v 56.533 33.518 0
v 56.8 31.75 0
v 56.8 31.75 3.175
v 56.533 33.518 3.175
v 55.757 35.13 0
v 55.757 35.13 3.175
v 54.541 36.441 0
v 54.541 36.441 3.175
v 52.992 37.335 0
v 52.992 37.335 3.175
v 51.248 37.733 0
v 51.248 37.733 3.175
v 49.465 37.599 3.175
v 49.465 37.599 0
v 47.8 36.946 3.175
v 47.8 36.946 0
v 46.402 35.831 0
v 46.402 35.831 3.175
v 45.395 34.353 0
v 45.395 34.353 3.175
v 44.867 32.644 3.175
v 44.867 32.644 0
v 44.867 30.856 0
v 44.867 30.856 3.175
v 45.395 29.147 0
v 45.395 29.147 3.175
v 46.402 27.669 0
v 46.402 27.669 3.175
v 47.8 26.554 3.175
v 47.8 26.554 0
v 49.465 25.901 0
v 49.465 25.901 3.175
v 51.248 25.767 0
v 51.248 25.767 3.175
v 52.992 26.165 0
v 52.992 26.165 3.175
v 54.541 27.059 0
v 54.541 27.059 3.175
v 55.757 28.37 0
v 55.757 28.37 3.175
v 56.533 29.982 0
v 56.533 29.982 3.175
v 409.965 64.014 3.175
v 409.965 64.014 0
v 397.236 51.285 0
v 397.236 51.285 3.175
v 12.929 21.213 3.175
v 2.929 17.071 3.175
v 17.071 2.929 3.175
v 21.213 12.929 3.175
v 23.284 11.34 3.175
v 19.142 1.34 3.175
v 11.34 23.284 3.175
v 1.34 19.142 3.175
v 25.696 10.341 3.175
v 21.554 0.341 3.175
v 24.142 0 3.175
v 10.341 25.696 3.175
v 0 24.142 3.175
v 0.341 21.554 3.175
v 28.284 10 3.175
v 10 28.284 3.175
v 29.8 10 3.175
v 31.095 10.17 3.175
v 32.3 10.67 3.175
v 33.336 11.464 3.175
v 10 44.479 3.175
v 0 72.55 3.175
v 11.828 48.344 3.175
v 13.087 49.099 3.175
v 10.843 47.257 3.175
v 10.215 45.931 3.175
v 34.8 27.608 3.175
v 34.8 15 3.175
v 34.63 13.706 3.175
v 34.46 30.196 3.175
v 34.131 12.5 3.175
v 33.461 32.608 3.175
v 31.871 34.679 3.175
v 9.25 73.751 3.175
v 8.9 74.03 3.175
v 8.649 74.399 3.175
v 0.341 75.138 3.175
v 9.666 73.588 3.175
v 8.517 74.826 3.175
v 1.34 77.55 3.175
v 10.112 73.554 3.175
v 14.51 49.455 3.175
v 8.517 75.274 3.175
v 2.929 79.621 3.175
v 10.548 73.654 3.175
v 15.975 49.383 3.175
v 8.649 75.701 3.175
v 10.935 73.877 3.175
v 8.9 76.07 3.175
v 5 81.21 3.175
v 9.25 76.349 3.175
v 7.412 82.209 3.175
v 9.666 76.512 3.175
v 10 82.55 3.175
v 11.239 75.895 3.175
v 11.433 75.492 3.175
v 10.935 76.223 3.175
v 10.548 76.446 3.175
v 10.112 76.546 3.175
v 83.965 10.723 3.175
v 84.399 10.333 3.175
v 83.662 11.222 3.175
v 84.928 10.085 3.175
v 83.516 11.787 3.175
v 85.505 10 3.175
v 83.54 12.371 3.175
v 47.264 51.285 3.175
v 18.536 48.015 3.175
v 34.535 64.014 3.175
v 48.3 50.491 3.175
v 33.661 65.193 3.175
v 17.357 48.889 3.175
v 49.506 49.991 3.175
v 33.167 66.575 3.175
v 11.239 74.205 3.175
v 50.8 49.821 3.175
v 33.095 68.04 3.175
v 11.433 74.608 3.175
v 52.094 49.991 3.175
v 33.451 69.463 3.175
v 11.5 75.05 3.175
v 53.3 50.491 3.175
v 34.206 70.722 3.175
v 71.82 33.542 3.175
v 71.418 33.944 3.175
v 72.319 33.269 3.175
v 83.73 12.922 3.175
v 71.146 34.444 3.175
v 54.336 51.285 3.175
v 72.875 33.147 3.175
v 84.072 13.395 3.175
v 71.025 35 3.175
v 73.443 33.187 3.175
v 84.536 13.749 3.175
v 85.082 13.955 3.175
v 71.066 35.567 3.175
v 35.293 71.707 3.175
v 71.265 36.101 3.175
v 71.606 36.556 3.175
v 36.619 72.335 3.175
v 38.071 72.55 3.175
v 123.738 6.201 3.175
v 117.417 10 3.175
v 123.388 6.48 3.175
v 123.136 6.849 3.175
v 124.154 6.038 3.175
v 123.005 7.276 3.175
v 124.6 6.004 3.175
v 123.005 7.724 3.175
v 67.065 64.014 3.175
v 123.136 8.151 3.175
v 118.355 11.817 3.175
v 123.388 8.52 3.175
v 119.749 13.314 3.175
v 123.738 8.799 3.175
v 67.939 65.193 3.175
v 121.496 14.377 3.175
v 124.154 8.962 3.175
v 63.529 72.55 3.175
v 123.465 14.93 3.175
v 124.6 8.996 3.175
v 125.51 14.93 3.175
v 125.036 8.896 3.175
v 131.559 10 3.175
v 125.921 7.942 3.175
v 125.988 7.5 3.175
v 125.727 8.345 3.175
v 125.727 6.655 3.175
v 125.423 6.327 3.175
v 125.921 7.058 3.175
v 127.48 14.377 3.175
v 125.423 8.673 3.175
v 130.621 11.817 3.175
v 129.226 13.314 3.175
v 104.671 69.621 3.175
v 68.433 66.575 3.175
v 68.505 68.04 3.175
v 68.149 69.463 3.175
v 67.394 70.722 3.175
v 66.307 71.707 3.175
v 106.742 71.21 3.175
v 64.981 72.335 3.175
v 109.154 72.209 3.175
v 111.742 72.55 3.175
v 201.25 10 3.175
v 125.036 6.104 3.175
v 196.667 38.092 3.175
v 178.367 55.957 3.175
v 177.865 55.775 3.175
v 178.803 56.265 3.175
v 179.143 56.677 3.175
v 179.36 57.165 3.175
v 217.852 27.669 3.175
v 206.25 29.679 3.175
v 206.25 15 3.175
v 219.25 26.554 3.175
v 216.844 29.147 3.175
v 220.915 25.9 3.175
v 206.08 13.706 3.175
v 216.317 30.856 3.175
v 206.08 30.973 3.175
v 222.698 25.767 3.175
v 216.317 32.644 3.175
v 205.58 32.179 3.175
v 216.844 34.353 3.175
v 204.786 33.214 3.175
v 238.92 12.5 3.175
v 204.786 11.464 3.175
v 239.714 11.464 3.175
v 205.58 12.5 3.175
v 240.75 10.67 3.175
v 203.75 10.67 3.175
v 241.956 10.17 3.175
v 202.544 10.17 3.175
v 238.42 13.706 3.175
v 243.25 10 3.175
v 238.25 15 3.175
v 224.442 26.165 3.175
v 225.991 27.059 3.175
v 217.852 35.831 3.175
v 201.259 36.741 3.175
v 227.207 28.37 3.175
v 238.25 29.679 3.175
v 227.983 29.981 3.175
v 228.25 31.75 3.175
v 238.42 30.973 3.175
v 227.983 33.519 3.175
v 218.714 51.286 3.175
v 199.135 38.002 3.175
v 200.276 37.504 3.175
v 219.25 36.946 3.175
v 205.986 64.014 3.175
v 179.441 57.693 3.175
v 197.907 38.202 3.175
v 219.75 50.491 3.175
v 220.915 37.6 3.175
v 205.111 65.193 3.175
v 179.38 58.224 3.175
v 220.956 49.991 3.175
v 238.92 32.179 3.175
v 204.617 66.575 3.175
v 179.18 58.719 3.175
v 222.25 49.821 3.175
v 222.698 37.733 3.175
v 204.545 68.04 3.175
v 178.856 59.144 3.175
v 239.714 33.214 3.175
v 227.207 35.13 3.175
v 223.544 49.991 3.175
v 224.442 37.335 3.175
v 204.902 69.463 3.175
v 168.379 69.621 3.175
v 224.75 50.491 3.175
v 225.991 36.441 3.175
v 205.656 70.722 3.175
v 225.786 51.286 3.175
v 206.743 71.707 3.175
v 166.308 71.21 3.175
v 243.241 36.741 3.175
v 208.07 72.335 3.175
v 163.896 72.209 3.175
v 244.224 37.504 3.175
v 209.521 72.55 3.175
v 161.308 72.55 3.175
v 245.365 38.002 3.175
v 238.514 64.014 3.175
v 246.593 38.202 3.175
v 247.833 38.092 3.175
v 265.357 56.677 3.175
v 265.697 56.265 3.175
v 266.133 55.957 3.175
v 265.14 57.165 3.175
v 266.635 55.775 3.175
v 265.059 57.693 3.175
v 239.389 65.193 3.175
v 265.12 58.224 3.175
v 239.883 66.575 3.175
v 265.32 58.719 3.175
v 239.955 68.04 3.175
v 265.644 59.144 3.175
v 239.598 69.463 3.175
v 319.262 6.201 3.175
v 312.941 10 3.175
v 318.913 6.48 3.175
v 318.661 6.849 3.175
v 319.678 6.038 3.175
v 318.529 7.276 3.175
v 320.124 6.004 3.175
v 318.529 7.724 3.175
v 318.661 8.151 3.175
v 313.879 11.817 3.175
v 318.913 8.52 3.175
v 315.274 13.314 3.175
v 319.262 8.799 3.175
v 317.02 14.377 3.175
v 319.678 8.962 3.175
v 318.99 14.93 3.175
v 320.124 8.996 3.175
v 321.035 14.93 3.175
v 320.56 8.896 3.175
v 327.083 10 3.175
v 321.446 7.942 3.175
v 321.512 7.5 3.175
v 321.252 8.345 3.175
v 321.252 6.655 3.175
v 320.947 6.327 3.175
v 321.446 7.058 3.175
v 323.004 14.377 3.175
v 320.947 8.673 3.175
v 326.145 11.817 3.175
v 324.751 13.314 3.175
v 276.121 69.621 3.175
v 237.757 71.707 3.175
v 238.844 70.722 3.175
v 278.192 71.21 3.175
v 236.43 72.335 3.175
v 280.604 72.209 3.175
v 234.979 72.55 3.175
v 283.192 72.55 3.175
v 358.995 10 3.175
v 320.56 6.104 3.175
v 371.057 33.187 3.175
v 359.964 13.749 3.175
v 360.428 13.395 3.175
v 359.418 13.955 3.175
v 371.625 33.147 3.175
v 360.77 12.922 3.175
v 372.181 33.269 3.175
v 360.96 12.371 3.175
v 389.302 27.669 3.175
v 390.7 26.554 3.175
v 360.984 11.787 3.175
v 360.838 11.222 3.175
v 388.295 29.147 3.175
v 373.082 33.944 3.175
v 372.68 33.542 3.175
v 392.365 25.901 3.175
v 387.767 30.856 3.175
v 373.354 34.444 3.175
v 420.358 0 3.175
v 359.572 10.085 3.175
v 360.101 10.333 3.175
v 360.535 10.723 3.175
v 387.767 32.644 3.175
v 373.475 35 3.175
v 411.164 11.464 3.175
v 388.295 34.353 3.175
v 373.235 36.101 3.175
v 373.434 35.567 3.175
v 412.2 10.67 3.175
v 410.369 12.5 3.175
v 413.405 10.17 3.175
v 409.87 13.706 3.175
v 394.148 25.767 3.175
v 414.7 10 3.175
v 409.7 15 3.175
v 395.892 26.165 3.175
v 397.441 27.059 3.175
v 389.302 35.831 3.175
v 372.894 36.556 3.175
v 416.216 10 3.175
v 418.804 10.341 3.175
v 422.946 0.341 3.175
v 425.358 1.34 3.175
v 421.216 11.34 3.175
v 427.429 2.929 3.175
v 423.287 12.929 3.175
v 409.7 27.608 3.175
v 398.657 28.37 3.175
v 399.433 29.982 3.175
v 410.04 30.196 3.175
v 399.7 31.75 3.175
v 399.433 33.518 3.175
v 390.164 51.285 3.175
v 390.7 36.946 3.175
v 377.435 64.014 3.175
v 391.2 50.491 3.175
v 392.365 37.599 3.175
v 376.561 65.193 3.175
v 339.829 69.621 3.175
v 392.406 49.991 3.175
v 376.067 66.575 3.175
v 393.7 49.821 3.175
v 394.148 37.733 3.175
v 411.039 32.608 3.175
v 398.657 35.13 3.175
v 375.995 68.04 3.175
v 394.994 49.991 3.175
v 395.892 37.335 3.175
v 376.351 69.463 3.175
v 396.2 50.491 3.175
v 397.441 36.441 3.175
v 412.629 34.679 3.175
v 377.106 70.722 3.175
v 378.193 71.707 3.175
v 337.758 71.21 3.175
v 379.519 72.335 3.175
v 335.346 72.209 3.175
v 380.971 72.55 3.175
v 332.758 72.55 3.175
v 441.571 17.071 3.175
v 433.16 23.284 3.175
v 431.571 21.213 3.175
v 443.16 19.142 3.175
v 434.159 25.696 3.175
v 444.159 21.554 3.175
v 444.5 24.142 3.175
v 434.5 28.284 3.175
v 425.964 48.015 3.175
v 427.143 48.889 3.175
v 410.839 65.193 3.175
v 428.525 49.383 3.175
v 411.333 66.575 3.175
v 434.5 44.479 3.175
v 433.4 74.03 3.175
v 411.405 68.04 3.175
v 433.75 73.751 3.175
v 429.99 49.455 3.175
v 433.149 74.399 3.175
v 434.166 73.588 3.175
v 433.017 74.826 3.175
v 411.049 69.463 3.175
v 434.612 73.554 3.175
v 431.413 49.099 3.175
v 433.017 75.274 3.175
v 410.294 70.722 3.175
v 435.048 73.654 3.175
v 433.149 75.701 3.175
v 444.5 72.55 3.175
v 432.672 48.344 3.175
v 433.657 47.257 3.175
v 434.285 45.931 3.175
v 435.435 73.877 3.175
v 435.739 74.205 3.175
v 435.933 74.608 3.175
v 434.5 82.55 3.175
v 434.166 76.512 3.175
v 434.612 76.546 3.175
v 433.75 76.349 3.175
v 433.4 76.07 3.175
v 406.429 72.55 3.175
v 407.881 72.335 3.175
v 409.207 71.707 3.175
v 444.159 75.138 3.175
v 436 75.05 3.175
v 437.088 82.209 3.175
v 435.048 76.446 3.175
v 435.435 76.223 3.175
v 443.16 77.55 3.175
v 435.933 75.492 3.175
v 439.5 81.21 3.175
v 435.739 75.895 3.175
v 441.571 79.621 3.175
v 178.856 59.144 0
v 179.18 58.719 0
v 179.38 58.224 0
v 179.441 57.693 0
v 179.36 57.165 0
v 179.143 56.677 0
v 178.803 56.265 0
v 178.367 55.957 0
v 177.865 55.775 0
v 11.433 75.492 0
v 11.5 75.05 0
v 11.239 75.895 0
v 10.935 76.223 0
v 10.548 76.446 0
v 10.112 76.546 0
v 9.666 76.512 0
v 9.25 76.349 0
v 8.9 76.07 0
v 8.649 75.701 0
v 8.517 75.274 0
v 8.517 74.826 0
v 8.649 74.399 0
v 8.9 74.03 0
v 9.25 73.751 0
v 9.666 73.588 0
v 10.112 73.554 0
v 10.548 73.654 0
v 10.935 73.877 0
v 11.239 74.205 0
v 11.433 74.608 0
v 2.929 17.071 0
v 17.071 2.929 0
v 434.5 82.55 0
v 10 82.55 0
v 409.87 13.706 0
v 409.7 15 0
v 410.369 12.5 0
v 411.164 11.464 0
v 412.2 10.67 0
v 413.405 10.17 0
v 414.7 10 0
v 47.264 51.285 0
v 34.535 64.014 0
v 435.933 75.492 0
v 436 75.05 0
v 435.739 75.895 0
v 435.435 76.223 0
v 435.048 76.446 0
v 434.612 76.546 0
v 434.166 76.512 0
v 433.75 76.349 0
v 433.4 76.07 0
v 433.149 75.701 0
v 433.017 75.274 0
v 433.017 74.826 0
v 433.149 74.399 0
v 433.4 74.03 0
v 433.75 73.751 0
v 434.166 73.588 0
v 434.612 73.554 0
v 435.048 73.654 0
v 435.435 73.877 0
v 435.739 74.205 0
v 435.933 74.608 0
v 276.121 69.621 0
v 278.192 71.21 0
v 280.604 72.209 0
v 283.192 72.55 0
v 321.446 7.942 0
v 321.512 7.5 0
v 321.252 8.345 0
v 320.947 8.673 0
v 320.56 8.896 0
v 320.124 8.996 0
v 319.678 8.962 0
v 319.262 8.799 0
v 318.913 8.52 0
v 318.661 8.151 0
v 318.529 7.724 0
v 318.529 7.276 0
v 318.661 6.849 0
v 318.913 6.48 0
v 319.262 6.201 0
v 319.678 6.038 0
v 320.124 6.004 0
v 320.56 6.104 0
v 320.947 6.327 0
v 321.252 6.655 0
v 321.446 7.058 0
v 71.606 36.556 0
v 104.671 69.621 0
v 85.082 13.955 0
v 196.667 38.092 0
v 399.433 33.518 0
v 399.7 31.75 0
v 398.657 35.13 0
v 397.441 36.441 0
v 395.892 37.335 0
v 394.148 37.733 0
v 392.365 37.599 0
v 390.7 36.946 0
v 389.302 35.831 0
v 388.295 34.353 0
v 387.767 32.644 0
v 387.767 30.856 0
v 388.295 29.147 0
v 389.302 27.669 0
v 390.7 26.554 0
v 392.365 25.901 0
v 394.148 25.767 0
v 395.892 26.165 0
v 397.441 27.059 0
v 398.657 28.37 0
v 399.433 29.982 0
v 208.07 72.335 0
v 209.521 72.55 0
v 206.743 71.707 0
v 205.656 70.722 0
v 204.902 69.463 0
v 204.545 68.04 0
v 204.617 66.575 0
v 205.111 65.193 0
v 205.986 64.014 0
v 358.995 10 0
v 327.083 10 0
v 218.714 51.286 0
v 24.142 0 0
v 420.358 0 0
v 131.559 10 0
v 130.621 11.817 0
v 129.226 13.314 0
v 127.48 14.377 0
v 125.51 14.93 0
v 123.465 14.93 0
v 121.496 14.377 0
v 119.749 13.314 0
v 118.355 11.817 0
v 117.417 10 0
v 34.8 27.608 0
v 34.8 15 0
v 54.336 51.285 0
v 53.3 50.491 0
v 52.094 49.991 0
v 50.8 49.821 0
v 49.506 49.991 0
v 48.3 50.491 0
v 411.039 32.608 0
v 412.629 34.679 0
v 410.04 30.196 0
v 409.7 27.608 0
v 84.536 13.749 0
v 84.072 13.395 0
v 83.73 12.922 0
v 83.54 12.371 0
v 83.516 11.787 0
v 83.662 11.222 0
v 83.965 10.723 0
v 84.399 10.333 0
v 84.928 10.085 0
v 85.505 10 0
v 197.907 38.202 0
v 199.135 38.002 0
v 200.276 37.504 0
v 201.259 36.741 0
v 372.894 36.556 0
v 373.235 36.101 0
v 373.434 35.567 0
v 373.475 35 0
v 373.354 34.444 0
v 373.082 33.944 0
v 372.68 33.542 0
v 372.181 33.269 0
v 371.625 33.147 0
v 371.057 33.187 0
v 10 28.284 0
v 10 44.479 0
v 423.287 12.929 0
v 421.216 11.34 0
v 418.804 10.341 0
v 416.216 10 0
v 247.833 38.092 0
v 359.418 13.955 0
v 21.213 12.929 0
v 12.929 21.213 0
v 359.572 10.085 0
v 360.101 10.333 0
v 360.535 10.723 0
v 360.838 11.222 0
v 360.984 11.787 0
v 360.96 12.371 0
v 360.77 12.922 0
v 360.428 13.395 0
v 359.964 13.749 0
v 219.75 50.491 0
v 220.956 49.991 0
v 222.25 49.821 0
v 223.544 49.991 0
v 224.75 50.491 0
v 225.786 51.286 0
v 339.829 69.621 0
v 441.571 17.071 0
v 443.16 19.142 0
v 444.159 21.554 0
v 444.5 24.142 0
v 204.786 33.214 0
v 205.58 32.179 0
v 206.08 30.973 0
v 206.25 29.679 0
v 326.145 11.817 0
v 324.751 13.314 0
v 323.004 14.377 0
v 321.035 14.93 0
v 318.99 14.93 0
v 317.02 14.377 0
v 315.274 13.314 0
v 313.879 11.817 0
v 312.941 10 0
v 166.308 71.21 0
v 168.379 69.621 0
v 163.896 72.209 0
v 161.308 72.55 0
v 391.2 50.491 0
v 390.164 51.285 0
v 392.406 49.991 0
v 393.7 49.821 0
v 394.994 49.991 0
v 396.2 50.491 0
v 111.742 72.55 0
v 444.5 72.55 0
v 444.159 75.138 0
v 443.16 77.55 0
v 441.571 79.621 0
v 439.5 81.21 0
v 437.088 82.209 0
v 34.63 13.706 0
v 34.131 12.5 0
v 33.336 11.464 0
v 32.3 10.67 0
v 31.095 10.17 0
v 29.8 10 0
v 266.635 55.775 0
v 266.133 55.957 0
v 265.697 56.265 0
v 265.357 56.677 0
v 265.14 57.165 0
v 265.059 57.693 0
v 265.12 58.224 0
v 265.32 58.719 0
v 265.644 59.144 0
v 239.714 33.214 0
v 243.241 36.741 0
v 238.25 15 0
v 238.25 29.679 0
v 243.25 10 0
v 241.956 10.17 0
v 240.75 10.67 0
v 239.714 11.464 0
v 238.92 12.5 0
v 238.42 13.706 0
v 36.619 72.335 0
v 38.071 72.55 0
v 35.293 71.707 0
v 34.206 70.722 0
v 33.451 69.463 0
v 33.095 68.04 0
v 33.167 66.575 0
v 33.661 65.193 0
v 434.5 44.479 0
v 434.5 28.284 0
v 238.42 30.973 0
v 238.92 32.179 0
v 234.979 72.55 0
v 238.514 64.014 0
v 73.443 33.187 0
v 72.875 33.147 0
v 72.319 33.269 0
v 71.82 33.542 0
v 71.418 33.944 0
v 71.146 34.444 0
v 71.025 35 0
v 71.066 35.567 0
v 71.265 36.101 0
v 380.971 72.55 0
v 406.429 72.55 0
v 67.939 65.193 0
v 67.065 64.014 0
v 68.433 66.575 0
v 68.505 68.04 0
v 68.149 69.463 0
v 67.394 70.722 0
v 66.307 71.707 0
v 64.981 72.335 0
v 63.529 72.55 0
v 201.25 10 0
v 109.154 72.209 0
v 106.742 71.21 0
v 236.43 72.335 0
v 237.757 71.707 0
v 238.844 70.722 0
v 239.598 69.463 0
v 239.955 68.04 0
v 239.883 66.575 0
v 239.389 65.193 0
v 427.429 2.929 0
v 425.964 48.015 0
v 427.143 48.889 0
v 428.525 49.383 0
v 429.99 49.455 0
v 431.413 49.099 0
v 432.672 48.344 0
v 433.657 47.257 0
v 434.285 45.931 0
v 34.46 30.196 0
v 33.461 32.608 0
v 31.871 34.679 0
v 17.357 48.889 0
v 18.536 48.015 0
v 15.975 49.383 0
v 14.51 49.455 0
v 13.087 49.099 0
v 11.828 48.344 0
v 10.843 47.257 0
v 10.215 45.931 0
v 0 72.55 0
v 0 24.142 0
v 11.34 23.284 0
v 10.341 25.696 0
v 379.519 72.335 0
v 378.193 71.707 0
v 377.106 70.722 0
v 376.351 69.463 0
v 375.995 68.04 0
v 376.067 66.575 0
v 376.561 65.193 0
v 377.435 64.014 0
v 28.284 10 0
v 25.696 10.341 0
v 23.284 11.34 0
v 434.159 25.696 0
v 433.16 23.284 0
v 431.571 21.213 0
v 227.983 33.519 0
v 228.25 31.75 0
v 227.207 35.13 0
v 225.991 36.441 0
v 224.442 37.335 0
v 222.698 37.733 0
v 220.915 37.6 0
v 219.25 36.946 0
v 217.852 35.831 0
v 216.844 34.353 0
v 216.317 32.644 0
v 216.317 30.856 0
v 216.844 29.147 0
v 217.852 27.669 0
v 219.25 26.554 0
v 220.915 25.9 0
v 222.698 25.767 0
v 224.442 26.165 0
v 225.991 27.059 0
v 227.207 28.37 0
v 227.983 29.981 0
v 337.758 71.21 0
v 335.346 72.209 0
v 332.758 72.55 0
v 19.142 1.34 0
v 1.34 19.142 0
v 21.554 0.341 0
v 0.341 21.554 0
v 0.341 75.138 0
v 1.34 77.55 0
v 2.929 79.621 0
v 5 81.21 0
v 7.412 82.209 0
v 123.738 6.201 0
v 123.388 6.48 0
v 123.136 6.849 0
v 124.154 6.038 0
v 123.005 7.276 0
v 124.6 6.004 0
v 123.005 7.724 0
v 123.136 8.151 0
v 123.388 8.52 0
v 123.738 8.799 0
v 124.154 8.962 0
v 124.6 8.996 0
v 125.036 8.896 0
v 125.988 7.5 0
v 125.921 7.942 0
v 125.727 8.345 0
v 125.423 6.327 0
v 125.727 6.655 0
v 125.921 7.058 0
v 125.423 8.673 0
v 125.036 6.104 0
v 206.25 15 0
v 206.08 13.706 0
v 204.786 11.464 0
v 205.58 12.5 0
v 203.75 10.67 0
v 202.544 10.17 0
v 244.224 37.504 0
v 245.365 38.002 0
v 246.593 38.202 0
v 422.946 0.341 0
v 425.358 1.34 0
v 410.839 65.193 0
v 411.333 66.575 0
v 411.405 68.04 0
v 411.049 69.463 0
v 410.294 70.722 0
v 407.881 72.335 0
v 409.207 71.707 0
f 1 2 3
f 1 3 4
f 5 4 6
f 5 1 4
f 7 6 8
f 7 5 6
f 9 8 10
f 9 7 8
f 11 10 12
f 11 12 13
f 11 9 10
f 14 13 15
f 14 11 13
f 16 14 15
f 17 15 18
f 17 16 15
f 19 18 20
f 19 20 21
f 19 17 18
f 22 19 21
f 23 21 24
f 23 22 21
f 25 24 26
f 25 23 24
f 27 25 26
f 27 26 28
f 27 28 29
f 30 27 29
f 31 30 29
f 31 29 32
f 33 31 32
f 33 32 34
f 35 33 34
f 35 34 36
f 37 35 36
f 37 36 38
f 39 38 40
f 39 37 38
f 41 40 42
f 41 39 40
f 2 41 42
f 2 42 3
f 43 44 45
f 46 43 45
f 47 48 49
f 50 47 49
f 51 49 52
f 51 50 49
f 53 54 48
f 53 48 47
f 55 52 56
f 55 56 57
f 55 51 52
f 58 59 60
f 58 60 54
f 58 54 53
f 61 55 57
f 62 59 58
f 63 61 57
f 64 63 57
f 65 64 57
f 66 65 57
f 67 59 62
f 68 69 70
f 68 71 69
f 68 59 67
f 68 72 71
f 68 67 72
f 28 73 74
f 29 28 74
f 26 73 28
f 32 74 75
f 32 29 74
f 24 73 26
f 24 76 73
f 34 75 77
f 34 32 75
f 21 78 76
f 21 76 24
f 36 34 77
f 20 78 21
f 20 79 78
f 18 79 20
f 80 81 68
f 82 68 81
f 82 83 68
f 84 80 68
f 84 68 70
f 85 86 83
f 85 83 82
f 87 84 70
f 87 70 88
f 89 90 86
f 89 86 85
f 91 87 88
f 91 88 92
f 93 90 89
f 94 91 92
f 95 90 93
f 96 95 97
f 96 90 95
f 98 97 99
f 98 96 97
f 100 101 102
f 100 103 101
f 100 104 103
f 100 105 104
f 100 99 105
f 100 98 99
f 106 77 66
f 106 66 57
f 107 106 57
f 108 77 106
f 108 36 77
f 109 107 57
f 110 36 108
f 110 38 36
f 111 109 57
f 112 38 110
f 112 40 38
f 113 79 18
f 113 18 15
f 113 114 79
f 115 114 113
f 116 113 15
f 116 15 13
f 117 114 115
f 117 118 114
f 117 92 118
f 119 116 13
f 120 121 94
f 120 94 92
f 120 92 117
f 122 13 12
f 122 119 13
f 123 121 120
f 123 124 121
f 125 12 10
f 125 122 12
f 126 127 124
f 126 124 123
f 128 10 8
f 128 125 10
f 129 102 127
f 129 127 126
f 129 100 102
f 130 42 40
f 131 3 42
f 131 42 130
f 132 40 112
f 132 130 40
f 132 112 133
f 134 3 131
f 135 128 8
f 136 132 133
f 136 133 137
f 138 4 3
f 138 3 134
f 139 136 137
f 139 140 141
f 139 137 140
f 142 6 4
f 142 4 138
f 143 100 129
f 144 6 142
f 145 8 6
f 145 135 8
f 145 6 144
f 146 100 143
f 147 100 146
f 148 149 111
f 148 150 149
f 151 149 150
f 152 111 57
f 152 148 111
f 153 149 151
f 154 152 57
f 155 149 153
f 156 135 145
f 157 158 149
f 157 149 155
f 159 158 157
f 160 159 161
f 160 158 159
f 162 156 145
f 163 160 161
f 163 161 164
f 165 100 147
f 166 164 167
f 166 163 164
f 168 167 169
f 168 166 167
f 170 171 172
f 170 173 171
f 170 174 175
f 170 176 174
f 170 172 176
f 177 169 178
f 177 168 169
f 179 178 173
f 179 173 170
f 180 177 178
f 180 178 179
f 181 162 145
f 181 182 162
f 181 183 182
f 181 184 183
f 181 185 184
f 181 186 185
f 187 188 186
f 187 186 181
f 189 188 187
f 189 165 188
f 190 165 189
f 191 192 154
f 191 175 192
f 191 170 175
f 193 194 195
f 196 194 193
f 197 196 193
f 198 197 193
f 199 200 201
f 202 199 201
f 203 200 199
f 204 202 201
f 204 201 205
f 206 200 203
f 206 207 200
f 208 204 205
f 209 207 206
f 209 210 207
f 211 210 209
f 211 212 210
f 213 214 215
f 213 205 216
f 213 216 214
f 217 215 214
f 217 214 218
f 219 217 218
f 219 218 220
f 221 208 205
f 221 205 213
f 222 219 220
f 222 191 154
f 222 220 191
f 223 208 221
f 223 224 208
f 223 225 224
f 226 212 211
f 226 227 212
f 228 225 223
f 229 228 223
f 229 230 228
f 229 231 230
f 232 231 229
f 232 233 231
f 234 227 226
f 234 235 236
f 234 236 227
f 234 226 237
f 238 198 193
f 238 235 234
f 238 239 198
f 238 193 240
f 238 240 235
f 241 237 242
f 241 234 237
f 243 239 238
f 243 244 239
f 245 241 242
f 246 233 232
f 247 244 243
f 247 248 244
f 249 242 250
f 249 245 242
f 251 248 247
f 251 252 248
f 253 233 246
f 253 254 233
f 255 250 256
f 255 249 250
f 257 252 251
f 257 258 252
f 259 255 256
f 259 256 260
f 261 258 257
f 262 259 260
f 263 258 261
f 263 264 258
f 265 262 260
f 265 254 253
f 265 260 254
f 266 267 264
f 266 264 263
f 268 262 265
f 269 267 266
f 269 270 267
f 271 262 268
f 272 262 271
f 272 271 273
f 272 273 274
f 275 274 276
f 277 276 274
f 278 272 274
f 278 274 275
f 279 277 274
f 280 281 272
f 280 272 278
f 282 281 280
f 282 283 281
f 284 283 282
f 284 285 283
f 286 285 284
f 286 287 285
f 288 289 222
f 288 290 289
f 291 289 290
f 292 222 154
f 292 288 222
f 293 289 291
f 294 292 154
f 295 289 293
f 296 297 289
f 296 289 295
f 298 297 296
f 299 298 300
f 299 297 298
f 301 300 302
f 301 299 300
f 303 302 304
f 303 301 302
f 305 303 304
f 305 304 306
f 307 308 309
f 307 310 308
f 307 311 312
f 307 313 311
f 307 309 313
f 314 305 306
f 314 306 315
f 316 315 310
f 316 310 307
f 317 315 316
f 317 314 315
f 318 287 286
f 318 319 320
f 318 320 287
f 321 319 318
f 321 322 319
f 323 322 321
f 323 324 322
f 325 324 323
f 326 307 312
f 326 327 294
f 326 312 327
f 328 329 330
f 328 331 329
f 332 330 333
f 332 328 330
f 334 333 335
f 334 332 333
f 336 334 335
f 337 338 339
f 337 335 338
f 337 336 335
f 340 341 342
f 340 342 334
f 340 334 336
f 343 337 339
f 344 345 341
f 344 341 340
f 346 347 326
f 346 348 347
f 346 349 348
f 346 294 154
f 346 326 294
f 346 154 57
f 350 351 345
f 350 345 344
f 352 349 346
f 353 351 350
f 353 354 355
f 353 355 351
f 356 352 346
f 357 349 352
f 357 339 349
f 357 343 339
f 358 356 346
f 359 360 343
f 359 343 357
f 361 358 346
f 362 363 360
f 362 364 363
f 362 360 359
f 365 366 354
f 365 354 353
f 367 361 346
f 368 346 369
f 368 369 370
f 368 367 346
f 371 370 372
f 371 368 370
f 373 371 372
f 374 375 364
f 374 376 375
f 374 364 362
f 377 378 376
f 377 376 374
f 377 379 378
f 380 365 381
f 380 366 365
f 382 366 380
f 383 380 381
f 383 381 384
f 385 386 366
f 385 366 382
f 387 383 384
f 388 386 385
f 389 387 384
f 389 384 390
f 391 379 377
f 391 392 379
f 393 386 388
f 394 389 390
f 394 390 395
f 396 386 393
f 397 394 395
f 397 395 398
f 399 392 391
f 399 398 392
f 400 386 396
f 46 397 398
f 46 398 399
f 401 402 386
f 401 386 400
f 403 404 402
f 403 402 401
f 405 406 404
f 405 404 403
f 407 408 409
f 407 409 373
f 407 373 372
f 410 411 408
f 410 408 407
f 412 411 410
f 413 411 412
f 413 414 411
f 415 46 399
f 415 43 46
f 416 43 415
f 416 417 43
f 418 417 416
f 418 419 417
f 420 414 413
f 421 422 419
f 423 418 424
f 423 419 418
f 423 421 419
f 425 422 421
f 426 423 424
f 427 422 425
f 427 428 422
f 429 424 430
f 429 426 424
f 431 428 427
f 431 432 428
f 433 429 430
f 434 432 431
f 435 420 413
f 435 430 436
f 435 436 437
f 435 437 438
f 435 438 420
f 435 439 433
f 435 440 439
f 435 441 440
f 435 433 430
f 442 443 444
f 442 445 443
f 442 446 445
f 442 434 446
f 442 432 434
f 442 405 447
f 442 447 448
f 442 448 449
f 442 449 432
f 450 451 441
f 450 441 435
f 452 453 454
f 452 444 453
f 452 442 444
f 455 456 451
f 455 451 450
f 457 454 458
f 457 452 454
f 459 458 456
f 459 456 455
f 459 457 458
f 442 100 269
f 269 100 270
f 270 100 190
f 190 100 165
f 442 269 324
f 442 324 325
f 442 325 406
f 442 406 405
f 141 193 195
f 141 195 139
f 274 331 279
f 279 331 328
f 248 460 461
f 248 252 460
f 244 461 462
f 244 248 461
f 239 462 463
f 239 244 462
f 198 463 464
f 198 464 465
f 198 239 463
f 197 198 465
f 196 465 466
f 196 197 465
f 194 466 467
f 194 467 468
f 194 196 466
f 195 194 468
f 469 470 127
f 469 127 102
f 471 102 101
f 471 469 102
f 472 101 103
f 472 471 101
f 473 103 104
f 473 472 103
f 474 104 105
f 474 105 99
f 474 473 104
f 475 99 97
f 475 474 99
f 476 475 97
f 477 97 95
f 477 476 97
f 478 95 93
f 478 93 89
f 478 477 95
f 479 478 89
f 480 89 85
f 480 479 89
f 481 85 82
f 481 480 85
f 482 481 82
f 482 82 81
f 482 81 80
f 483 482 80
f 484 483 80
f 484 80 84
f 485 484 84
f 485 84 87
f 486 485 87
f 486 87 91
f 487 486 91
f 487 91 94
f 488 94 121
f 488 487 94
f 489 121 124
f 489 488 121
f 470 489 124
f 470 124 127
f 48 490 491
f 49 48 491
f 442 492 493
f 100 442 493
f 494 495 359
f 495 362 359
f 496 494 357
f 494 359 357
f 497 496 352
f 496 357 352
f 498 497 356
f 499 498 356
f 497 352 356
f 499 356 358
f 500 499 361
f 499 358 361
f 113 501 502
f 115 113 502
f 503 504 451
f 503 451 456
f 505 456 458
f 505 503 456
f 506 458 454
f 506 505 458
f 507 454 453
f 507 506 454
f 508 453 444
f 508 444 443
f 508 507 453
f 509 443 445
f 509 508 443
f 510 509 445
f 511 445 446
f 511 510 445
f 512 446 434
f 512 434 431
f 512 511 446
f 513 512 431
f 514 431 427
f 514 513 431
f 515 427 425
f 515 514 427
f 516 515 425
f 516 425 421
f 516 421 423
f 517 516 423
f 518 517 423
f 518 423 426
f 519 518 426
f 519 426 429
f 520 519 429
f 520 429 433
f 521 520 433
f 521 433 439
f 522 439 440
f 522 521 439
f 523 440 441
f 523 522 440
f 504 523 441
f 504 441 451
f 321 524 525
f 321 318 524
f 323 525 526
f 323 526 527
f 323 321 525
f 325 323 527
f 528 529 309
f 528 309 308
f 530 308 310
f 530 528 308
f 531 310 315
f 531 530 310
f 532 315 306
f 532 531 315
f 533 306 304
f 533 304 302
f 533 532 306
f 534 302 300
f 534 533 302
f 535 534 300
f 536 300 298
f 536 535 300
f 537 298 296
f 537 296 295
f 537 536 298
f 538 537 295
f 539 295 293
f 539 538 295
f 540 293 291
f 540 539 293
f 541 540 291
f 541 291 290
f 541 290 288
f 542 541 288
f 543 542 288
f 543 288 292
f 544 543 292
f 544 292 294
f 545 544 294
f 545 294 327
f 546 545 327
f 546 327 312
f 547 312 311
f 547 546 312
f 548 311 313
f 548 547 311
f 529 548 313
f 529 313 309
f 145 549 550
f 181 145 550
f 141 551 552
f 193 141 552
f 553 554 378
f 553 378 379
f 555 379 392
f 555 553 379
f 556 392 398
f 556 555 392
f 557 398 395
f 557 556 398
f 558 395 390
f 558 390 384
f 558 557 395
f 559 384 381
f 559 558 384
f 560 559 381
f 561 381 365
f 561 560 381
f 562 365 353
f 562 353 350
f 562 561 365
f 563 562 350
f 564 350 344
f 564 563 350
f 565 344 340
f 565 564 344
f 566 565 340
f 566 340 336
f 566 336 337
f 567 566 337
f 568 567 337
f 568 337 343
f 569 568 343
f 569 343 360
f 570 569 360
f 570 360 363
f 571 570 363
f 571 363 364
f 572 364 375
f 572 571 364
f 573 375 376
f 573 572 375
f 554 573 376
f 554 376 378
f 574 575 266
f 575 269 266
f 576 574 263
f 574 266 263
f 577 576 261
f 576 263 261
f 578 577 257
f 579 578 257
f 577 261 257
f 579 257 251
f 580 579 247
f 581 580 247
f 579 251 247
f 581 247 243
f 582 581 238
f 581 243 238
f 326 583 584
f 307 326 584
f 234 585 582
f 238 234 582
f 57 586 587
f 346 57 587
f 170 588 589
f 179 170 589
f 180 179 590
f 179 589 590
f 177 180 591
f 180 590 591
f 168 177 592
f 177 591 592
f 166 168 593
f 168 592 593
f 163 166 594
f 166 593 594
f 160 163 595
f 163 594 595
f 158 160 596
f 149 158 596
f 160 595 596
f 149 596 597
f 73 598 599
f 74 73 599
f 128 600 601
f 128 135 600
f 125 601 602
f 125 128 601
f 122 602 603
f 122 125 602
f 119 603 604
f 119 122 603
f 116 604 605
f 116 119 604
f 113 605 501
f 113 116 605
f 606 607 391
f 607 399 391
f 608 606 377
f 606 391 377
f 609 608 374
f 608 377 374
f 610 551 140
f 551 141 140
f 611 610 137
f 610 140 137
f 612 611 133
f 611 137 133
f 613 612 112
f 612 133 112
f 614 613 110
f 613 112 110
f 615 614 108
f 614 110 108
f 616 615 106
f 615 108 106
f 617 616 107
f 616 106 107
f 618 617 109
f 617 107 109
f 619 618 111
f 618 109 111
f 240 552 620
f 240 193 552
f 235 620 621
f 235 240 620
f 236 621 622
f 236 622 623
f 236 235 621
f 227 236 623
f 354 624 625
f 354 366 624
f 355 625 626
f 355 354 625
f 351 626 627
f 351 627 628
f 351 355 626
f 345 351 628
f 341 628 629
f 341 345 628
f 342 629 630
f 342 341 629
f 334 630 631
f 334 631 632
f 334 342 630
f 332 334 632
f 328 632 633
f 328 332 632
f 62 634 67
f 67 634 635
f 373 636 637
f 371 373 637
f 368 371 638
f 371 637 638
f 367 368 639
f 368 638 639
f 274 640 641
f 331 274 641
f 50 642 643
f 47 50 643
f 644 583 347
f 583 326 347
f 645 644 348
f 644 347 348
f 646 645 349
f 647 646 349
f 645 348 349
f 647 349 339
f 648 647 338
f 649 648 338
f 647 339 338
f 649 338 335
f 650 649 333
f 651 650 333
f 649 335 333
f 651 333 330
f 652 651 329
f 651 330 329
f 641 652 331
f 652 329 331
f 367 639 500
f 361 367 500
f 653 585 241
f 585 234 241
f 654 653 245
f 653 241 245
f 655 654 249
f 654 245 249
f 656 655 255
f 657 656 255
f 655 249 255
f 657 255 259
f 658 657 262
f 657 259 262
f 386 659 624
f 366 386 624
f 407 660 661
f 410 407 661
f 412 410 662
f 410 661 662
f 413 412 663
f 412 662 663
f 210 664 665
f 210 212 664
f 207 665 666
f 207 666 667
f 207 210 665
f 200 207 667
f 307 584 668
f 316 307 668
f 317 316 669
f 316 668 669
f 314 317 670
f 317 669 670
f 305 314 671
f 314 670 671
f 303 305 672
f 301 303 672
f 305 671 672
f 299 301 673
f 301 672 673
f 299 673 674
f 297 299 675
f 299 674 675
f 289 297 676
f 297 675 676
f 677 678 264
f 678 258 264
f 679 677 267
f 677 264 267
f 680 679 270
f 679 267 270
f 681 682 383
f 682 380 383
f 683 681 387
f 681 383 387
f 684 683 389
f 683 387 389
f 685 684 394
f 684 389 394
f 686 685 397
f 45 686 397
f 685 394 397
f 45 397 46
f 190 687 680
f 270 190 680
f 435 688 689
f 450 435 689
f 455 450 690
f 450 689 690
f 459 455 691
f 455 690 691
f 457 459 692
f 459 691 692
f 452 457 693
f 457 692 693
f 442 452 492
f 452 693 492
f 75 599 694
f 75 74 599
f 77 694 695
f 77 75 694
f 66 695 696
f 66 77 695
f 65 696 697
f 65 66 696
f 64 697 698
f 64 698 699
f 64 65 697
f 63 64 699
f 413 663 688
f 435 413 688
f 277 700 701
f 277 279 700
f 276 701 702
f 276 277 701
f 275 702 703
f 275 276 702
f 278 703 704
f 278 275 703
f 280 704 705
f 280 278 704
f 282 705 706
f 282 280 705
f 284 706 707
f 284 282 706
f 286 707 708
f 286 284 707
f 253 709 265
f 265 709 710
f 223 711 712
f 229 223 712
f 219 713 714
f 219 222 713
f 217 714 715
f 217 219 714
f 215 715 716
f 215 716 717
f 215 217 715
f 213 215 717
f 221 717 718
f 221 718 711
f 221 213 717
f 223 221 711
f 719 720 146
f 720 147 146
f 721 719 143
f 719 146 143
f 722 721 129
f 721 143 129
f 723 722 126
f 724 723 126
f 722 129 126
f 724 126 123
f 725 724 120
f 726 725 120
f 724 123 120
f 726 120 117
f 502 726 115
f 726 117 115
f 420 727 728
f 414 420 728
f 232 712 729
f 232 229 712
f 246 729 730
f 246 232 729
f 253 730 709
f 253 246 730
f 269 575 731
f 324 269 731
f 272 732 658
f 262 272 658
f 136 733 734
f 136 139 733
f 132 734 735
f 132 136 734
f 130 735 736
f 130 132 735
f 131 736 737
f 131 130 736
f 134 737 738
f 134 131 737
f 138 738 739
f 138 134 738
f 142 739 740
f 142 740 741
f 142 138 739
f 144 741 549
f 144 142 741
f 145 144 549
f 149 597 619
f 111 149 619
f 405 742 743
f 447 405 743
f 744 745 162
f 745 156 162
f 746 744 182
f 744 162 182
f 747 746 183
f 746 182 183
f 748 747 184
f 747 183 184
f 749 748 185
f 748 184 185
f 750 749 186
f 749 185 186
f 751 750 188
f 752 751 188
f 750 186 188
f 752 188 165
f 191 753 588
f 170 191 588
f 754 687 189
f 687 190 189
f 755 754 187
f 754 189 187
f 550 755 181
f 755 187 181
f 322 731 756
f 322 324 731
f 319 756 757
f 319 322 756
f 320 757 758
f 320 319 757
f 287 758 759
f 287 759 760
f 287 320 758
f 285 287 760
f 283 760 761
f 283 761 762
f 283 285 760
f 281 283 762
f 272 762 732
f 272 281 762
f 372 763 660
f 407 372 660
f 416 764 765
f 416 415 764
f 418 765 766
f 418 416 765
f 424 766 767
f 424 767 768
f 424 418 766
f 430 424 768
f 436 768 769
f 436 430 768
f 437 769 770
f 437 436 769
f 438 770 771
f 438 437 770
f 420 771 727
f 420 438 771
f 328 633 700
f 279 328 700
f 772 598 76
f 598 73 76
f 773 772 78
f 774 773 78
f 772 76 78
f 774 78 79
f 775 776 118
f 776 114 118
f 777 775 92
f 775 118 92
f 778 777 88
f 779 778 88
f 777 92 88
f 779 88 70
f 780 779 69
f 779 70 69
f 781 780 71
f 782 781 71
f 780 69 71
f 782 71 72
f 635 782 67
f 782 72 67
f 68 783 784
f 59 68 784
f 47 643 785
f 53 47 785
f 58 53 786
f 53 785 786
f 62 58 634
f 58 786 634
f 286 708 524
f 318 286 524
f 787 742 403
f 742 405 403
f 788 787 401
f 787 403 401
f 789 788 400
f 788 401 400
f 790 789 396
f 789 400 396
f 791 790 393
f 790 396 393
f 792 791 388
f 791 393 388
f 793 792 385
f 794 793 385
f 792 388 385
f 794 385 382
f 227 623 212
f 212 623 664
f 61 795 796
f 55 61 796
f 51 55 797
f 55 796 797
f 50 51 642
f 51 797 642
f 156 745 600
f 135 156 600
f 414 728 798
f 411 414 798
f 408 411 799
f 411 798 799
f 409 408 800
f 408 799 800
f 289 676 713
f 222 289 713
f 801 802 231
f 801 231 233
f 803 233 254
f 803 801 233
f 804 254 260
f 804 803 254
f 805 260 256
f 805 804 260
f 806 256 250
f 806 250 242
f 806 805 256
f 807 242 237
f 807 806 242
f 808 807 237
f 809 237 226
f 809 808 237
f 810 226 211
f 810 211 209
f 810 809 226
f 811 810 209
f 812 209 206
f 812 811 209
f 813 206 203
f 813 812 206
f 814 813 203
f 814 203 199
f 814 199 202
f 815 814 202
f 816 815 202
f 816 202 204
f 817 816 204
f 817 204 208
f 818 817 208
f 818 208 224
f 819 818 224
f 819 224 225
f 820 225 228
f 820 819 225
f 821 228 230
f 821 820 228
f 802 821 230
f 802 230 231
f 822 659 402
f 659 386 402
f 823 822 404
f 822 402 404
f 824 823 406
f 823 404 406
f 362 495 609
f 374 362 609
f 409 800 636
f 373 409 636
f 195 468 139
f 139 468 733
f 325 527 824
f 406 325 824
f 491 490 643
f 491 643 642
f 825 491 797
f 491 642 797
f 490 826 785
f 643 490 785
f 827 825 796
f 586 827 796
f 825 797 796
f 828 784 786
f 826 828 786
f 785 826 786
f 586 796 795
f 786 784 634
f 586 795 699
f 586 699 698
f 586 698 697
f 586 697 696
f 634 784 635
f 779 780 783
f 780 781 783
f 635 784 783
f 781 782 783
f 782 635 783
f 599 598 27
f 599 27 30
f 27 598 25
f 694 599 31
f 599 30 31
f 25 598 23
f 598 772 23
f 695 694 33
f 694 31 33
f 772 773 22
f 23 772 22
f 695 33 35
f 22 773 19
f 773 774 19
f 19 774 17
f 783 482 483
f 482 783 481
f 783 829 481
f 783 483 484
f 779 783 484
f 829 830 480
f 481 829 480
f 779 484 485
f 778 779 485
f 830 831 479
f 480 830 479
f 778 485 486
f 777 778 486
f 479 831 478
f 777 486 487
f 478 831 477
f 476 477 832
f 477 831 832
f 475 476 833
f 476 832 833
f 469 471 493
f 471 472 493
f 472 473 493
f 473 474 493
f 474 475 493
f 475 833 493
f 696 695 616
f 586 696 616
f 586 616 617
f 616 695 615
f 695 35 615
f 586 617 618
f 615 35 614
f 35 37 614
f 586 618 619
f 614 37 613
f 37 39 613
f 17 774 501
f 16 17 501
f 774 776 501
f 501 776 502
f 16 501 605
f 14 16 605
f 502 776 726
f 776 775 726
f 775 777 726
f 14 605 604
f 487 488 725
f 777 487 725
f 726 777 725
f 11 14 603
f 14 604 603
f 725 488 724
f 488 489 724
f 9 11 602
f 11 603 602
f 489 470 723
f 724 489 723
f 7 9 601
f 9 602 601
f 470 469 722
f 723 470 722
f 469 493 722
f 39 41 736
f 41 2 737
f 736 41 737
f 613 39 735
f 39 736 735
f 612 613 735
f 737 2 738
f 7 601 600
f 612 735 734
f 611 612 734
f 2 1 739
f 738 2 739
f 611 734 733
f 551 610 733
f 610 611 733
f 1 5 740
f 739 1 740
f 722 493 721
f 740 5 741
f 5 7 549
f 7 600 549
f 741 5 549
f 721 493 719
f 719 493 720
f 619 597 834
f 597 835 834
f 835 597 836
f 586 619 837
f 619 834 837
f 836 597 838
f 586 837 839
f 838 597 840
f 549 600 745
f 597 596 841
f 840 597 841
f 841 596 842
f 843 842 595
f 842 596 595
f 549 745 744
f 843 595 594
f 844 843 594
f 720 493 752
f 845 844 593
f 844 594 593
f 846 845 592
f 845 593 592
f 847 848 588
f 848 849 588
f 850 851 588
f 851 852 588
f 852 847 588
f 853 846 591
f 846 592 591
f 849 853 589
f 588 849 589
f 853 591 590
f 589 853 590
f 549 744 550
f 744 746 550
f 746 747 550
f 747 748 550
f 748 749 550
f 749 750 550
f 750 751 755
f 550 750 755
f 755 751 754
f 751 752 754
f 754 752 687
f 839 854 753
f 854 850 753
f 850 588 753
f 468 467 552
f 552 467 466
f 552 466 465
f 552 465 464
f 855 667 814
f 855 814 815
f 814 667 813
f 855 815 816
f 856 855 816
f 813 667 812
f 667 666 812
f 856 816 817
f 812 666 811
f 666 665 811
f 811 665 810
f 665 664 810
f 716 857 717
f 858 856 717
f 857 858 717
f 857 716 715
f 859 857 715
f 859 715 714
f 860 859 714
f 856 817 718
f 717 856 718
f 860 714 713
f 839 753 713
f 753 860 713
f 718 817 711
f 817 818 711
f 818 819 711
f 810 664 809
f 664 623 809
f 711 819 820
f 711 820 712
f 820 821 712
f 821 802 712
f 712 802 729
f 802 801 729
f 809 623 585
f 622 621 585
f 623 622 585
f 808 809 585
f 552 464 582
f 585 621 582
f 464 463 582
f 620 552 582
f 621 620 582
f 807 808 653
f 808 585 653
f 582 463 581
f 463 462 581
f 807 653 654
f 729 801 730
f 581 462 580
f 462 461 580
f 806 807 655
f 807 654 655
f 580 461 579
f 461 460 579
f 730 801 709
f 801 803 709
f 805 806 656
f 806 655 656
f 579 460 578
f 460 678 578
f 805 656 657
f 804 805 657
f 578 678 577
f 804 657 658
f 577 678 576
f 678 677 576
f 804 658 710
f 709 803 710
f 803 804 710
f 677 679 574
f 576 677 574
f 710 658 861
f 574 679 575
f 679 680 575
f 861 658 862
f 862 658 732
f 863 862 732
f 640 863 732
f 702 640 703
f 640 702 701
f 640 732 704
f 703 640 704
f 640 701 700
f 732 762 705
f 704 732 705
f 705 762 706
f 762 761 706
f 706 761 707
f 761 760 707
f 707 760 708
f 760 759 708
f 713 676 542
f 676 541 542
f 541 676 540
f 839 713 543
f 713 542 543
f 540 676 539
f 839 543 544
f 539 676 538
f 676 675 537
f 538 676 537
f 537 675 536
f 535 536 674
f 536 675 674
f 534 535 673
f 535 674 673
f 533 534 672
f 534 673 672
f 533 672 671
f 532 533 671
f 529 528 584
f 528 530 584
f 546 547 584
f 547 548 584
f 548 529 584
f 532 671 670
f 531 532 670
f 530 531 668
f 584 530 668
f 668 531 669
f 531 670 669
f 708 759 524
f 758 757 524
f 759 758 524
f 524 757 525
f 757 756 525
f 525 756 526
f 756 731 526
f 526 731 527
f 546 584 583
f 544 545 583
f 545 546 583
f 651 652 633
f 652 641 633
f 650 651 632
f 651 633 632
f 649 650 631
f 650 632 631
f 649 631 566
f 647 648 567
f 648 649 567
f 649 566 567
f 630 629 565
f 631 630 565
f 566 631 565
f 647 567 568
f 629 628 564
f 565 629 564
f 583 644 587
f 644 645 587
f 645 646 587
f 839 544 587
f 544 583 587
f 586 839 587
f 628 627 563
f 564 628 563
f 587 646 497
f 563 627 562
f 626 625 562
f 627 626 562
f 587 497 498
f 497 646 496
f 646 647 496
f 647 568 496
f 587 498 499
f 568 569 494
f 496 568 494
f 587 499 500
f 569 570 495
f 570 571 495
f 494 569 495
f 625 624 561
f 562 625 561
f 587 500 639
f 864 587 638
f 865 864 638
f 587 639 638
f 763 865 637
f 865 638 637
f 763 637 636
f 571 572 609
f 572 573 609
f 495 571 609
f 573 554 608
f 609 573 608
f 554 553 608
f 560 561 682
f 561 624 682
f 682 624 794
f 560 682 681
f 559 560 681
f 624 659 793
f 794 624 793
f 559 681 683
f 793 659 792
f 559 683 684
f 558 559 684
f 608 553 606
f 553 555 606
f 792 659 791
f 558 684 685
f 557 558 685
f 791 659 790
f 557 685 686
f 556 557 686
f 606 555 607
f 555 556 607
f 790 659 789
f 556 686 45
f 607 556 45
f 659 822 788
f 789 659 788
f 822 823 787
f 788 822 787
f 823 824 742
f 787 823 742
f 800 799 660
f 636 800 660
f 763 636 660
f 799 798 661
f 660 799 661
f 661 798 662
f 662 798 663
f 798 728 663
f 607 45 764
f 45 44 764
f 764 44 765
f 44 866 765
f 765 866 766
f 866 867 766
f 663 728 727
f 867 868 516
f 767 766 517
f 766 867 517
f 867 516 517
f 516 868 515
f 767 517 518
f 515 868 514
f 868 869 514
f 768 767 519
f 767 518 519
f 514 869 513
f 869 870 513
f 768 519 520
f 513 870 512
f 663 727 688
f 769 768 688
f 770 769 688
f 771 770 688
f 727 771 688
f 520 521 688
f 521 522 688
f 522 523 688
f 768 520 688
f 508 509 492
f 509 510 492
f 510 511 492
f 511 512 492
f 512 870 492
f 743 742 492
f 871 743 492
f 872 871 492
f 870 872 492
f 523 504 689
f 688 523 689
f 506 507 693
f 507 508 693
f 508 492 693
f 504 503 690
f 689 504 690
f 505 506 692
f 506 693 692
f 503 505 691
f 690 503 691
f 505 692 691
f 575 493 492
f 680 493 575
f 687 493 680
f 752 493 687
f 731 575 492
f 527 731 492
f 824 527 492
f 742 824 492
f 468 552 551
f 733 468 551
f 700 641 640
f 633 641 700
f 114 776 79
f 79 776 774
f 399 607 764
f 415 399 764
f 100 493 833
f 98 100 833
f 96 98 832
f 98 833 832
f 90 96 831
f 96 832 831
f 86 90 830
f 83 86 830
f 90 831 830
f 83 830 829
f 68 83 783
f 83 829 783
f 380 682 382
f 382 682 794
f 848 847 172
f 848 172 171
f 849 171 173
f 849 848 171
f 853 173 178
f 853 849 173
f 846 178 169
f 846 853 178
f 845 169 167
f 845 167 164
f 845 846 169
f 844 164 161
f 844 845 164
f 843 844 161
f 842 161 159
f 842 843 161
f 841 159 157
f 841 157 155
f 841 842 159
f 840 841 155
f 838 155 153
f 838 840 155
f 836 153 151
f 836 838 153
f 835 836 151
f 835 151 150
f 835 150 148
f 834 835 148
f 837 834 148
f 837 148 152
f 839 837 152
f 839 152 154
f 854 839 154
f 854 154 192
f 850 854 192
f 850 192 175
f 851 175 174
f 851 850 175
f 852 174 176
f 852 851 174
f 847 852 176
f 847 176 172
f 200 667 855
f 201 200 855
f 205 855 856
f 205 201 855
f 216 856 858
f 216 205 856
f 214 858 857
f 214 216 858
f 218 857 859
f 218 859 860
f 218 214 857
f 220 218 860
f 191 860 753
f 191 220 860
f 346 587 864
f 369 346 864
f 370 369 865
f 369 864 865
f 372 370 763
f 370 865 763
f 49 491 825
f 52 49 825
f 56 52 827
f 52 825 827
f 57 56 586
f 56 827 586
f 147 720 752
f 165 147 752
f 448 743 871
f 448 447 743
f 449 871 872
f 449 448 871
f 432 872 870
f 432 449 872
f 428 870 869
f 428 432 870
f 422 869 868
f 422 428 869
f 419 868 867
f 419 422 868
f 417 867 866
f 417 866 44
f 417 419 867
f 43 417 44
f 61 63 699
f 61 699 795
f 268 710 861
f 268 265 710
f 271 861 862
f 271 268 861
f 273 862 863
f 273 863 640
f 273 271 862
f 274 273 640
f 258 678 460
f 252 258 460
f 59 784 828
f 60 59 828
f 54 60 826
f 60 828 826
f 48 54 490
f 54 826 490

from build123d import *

# Parameters (mm, degrees)
SKETCH1_R           = 1.5
SKETCH1_R_2         = 5.999572562
SKETCH1_R_3         = 6
BOSS_EXTRUDE1_DEPTH = 3.175
FILLET1_R           = 10
FILLET2_R           = 5
FILLET3_R           = 5
FILLET4_R           = 5
FILLET5_R           = 2


with BuildPart() as part:
    # Sketch1 → Boss-Extrude1 (new body)
    with BuildSketch(Plane.XY):
        with BuildLine():
            ThreePointArc((0, 24.142135624), (0.761204675, 20.3153013), (2.928932188, 17.071067812))
            Line((2.928932188, 17.071067812), (17.071067812, 2.928932188))
            ThreePointArc((17.071067812, 2.928932188), (20.3153013, 0.761204675), (24.142135624, 0))
            Line((24.142135624, 0), (420.357864376, 0))
            ThreePointArc((420.357864376, 0), (424.1846987, 0.761204675), (427.428932188, 2.928932188))
            Line((427.428932188, 2.928932188), (441.571067812, 17.071067812))
            ThreePointArc((441.571067812, 17.071067812), (443.738795325, 20.3153013), (444.5, 24.142135624))
            Line((444.5, 24.142135624), (444.5, 72.55))
            ThreePointArc((444.5, 72.55), (441.571067812, 79.621067812), (434.5, 82.55))
            Line((434.5, 82.55), (10, 82.55))
            ThreePointArc((10, 82.55), (2.928932188, 79.621067812), (0, 72.55))
            Line((0, 72.55), (0, 24.142135624))
        make_face()
        with Locations((124.487832174, 7.5)):
            Circle(SKETCH1_R, mode=Mode.SUBTRACT)
        with BuildLine():
            ThreePointArc((12.928932188, 21.213203436), (10.761204675, 24.457436924), (10, 28.284271247))
            Line((10, 28.284271247), (10, 56.550427438))
            Line((10, 56.550427438), (34.800427438, 31.75))
            Line((34.800427438, 31.75), (34.800427438, 10))
            Line((34.800427438, 10), (28.284271247, 10))
            ThreePointArc((28.284271247, 10), (24.457436924, 10.761204675), (21.213203436, 12.928932188))
            Line((21.213203436, 12.928932188), (12.928932188, 21.213203436))
        make_face(mode=Mode.SUBTRACT)
        with Locations((50.8, 31.75)):
            Circle(SKETCH1_R_2, mode=Mode.SUBTRACT)
        with BuildLine():
            Line((199.331464685, 38.668535315), (206.25, 31.75))
            Line((206.25, 31.75), (206.25, 10))
            Line((206.25, 10), (131.558899986, 10))
            ThreePointArc((131.558899986, 10), (124.487832174, 15), (117.416764362, 10))
            Line((117.416764362, 10), (66.799572562, 10))
            Line((66.799572562, 10), (199.331464685, 38.668535315))
        make_face(mode=Mode.SUBTRACT)
        with Locations((320.012167826, 7.5)):
            Circle(SKETCH1_R, mode=Mode.SUBTRACT)
        with BuildLine():
            Line((238.25, 10), (238.25, 31.75))
            Line((238.25, 31.75), (245.168535315, 38.668535315))
            Line((245.168535315, 38.668535315), (377.700427438, 10))
            Line((377.700427438, 10), (327.083235638, 10))
            ThreePointArc((327.083235638, 10), (320.012167826, 15), (312.941100014, 10))
            Line((312.941100014, 10), (238.25, 10))
        make_face(mode=Mode.SUBTRACT)
        with Locations((222.25, 31.75)):
            Circle(SKETCH1_R_3, mode=Mode.SUBTRACT)
        with Locations((393.7, 31.75)):
            Circle(SKETCH1_R_2, mode=Mode.SUBTRACT)
        with BuildLine():
            Line((434.5, 56.550427438), (434.5, 28.284271247))
            ThreePointArc((434.5, 28.284271247), (433.738795325, 24.457436924), (431.571067812, 21.213203436))
            Line((431.571067812, 21.213203436), (423.286796564, 12.928932188))
            ThreePointArc((423.286796564, 12.928932188), (420.042563076, 10.761204675), (416.215728753, 10))
            Line((416.215728753, 10), (409.699572562, 10))
            Line((409.699572562, 10), (409.699572562, 31.75))
            Line((409.699572562, 31.75), (434.5, 56.550427438))
        make_face(mode=Mode.SUBTRACT)
        Polygon((50.8, 47.749572562), (25.999572562, 72.55), (75.600427438, 72.55), align=None, mode=Mode.SUBTRACT)
        Polygon((181.449572562, 56.550427438), (66.799572562, 31.75), (107.599572562, 72.55), (165.45, 72.55), align=None, mode=Mode.SUBTRACT)
        Polygon((247.05, 72.55), (222.25, 47.75), (197.45, 72.55), align=None, mode=Mode.SUBTRACT)
        with Locations((10, 75.05)):
            Circle(SKETCH1_R, mode=Mode.SUBTRACT)
        Polygon((263.050427438, 56.550427438), (279.05, 72.55), (336.900427438, 72.55), (377.700427438, 31.75), align=None, mode=Mode.SUBTRACT)
        Polygon((418.500427438, 72.55), (393.7, 47.749572562), (368.899572562, 72.55), align=None, mode=Mode.SUBTRACT)
        with Locations((434.5, 75.05)):
            Circle(SKETCH1_R, mode=Mode.SUBTRACT)
    extrude(amount=BOSS_EXTRUDE1_DEPTH)

    # Fillet1
    fillet1_edges = [part.edges().sort_by_distance(p)[0] for p in [
        (34.800427438, 31.75, 1.5875),
        (409.699572562, 31.75, 1.5875),
        (336.900427438, 72.55, 1.5875),
        (279.05, 72.55, 1.5875),
        (165.45, 72.55, 1.5875),
        (107.599572562, 72.55, 1.5875),
    ]]
    fillet(fillet1_edges, radius=FILLET1_R)

    # Fillet2
    fillet2_edges = [part.edges().sort_by_distance(p)[0] for p in [
        (245.168535315, 38.668535315, 1.5875),
        (238.25, 31.75, 1.5875),
        (238.25, 10, 1.5875),
        (34.800427438, 10, 1.5875),
        (409.699572562, 10, 1.5875),
        (206.25, 10, 1.5875),
        (206.25, 31.75, 1.5875),
        (199.331464685, 38.668535315, 1.5875),
    ]]
    fillet(fillet2_edges, radius=FILLET2_R)

    # Fillet3
    fillet3_edges = [part.edges().sort_by_distance(p)[0] for p in [
        (222.25, 47.75, 1.5875),
        (247.05, 72.55, 1.5875),
        (197.45, 72.55, 1.5875),
    ]]
    fillet(fillet3_edges, radius=FILLET3_R)

    # Fillet4
    fillet4_edges = [part.edges().sort_by_distance(p)[0] for p in [
        (10, 56.550427438, 1.5875),
        (434.5, 56.550427438, 1.5875),
        (75.600427438, 72.55, 1.5875),
        (25.999572562, 72.55, 1.5875),
        (50.8, 47.749572562, 1.5875),
        (393.7, 47.749572562, 1.5875),
        (418.500427438, 72.55, 1.5875),
        (368.899572562, 72.55, 1.5875),
    ]]
    fillet(fillet4_edges, radius=FILLET4_R)

    # Fillet5
    fillet5_edges = [part.edges().sort_by_distance(p)[0] for p in [
        (377.700427438, 10, 1.5875),
        (377.700427438, 31.75, 1.5875),
        (263.050427438, 56.550427438, 1.5875),
        (66.799572562, 31.75, 1.5875),
        (181.449572562, 56.550427438, 1.5875),
        (66.799572562, 10, 1.5875),
    ]]
    fillet(fillet5_edges, radius=FILLET5_R)


solid = part.part
